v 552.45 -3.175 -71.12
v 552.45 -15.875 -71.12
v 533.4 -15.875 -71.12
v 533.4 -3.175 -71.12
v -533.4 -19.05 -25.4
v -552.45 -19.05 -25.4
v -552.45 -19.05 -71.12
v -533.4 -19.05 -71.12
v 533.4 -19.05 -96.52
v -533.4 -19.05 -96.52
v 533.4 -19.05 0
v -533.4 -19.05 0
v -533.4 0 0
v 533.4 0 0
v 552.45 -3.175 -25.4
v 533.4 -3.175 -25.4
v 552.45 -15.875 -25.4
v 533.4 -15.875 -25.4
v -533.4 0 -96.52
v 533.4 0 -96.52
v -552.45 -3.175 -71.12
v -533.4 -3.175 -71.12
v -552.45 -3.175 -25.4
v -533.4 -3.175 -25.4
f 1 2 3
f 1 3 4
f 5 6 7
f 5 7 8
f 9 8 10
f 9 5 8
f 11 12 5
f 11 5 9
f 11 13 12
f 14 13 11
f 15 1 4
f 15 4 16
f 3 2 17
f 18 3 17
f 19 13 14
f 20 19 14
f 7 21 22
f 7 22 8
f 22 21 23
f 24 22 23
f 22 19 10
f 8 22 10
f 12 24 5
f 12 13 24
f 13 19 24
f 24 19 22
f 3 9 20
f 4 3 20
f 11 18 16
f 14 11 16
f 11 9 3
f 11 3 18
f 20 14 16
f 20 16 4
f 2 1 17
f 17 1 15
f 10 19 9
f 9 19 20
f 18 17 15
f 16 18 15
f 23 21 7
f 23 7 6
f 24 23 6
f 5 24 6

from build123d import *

# Parameters (mm, degrees)
F0_W      = 1104.9
F0_H      = 96.52
F1_DEPTH  = 19.05
F2_W      = 19.05
F2_H      = 25.4
F3_DEPTH  = 19.05
F4_W      = 19.05
F4_H      = 25.4
F5_DEPTH  = 19.05
F6_W      = 3.175
F6_H      = 45.72
F7_DEPTH  = 19.05
F8_W      = 19.05
F8_H      = 25.4
F9_DEPTH  = 19.05
F10_W     = 19.05
F10_H     = 25.4
F11_DEPTH = 19.05
F12_W     = 3.175
F12_H     = 45.72
F13_DEPTH = 19.05
F14_W     = 3.175
F14_H     = 45.72
F15_DEPTH = 19.05


# Not quite as in the source:
# - a length typed as a fraction of an inch, garbled in the dataset ("3 / 203.2 mm" for 3/8 in), is restored


with BuildPart() as f1:
    # F0 (on Front) → F1 (new body)
    with BuildSketch(Plane.XZ):
        with Locations((0, -48.26)):
            Rectangle(F0_W, F0_H)
    extrude(amount=F1_DEPTH)

    # F2 (on face) → F3 (cut)
    with BuildSketch(Plane(origin=(-552.45, 0, 0), x_dir=(0, -1, 0), z_dir=(-1, 0, 0))):
        with Locations((9.525, -12.7)):
            Rectangle(F2_W, F2_H)
    extrude(amount=-F3_DEPTH, mode=Mode.SUBTRACT)

    # F4 (on face) → F5 (cut)
    with BuildSketch(Plane(origin=(-552.45, 0, 0), x_dir=(0, -1, 0), z_dir=(-1, 0, 0))):
        with Locations((9.525, -83.82)):
            Rectangle(F4_W, F4_H)
    extrude(amount=-F5_DEPTH, mode=Mode.SUBTRACT)

    # F6 (on face) → F7 (cut)
    with BuildSketch(Plane(origin=(-552.45, 0, 0), x_dir=(0, -1, 0), z_dir=(-1, 0, 0))):
        with Locations((1.5875, -48.26)):
            Rectangle(F6_W, F6_H)
    extrude(amount=-F7_DEPTH, mode=Mode.SUBTRACT)

    # F8 (on face) → F9 (cut)
    with BuildSketch(Plane.YZ.offset(552.45)):
        with Locations((-9.525, -12.7)):
            Rectangle(F8_W, F8_H)
    extrude(amount=-F9_DEPTH, mode=Mode.SUBTRACT)

    # F10 (on face) → F11 (cut)
    with BuildSketch(Plane.YZ.offset(552.45)):
        with Locations((-9.525, -83.82)):
            Rectangle(F10_W, F10_H)
    extrude(amount=-F11_DEPTH, mode=Mode.SUBTRACT)

    # F12 (on face) → F13 (cut)
    with BuildSketch(Plane.YZ.offset(552.45)):
        with Locations((-17.4625, -48.26)):
            Rectangle(F12_W, F12_H)
    extrude(amount=-F13_DEPTH, mode=Mode.SUBTRACT)

    # F14 (on face) → F15 (cut)
    with BuildSketch(Plane.YZ.offset(552.45)):
        with Locations((-1.5875, -48.26)):
            Rectangle(F14_W, F14_H)
    extrude(amount=-F15_DEPTH, mode=Mode.SUBTRACT)


solid = f1.part
